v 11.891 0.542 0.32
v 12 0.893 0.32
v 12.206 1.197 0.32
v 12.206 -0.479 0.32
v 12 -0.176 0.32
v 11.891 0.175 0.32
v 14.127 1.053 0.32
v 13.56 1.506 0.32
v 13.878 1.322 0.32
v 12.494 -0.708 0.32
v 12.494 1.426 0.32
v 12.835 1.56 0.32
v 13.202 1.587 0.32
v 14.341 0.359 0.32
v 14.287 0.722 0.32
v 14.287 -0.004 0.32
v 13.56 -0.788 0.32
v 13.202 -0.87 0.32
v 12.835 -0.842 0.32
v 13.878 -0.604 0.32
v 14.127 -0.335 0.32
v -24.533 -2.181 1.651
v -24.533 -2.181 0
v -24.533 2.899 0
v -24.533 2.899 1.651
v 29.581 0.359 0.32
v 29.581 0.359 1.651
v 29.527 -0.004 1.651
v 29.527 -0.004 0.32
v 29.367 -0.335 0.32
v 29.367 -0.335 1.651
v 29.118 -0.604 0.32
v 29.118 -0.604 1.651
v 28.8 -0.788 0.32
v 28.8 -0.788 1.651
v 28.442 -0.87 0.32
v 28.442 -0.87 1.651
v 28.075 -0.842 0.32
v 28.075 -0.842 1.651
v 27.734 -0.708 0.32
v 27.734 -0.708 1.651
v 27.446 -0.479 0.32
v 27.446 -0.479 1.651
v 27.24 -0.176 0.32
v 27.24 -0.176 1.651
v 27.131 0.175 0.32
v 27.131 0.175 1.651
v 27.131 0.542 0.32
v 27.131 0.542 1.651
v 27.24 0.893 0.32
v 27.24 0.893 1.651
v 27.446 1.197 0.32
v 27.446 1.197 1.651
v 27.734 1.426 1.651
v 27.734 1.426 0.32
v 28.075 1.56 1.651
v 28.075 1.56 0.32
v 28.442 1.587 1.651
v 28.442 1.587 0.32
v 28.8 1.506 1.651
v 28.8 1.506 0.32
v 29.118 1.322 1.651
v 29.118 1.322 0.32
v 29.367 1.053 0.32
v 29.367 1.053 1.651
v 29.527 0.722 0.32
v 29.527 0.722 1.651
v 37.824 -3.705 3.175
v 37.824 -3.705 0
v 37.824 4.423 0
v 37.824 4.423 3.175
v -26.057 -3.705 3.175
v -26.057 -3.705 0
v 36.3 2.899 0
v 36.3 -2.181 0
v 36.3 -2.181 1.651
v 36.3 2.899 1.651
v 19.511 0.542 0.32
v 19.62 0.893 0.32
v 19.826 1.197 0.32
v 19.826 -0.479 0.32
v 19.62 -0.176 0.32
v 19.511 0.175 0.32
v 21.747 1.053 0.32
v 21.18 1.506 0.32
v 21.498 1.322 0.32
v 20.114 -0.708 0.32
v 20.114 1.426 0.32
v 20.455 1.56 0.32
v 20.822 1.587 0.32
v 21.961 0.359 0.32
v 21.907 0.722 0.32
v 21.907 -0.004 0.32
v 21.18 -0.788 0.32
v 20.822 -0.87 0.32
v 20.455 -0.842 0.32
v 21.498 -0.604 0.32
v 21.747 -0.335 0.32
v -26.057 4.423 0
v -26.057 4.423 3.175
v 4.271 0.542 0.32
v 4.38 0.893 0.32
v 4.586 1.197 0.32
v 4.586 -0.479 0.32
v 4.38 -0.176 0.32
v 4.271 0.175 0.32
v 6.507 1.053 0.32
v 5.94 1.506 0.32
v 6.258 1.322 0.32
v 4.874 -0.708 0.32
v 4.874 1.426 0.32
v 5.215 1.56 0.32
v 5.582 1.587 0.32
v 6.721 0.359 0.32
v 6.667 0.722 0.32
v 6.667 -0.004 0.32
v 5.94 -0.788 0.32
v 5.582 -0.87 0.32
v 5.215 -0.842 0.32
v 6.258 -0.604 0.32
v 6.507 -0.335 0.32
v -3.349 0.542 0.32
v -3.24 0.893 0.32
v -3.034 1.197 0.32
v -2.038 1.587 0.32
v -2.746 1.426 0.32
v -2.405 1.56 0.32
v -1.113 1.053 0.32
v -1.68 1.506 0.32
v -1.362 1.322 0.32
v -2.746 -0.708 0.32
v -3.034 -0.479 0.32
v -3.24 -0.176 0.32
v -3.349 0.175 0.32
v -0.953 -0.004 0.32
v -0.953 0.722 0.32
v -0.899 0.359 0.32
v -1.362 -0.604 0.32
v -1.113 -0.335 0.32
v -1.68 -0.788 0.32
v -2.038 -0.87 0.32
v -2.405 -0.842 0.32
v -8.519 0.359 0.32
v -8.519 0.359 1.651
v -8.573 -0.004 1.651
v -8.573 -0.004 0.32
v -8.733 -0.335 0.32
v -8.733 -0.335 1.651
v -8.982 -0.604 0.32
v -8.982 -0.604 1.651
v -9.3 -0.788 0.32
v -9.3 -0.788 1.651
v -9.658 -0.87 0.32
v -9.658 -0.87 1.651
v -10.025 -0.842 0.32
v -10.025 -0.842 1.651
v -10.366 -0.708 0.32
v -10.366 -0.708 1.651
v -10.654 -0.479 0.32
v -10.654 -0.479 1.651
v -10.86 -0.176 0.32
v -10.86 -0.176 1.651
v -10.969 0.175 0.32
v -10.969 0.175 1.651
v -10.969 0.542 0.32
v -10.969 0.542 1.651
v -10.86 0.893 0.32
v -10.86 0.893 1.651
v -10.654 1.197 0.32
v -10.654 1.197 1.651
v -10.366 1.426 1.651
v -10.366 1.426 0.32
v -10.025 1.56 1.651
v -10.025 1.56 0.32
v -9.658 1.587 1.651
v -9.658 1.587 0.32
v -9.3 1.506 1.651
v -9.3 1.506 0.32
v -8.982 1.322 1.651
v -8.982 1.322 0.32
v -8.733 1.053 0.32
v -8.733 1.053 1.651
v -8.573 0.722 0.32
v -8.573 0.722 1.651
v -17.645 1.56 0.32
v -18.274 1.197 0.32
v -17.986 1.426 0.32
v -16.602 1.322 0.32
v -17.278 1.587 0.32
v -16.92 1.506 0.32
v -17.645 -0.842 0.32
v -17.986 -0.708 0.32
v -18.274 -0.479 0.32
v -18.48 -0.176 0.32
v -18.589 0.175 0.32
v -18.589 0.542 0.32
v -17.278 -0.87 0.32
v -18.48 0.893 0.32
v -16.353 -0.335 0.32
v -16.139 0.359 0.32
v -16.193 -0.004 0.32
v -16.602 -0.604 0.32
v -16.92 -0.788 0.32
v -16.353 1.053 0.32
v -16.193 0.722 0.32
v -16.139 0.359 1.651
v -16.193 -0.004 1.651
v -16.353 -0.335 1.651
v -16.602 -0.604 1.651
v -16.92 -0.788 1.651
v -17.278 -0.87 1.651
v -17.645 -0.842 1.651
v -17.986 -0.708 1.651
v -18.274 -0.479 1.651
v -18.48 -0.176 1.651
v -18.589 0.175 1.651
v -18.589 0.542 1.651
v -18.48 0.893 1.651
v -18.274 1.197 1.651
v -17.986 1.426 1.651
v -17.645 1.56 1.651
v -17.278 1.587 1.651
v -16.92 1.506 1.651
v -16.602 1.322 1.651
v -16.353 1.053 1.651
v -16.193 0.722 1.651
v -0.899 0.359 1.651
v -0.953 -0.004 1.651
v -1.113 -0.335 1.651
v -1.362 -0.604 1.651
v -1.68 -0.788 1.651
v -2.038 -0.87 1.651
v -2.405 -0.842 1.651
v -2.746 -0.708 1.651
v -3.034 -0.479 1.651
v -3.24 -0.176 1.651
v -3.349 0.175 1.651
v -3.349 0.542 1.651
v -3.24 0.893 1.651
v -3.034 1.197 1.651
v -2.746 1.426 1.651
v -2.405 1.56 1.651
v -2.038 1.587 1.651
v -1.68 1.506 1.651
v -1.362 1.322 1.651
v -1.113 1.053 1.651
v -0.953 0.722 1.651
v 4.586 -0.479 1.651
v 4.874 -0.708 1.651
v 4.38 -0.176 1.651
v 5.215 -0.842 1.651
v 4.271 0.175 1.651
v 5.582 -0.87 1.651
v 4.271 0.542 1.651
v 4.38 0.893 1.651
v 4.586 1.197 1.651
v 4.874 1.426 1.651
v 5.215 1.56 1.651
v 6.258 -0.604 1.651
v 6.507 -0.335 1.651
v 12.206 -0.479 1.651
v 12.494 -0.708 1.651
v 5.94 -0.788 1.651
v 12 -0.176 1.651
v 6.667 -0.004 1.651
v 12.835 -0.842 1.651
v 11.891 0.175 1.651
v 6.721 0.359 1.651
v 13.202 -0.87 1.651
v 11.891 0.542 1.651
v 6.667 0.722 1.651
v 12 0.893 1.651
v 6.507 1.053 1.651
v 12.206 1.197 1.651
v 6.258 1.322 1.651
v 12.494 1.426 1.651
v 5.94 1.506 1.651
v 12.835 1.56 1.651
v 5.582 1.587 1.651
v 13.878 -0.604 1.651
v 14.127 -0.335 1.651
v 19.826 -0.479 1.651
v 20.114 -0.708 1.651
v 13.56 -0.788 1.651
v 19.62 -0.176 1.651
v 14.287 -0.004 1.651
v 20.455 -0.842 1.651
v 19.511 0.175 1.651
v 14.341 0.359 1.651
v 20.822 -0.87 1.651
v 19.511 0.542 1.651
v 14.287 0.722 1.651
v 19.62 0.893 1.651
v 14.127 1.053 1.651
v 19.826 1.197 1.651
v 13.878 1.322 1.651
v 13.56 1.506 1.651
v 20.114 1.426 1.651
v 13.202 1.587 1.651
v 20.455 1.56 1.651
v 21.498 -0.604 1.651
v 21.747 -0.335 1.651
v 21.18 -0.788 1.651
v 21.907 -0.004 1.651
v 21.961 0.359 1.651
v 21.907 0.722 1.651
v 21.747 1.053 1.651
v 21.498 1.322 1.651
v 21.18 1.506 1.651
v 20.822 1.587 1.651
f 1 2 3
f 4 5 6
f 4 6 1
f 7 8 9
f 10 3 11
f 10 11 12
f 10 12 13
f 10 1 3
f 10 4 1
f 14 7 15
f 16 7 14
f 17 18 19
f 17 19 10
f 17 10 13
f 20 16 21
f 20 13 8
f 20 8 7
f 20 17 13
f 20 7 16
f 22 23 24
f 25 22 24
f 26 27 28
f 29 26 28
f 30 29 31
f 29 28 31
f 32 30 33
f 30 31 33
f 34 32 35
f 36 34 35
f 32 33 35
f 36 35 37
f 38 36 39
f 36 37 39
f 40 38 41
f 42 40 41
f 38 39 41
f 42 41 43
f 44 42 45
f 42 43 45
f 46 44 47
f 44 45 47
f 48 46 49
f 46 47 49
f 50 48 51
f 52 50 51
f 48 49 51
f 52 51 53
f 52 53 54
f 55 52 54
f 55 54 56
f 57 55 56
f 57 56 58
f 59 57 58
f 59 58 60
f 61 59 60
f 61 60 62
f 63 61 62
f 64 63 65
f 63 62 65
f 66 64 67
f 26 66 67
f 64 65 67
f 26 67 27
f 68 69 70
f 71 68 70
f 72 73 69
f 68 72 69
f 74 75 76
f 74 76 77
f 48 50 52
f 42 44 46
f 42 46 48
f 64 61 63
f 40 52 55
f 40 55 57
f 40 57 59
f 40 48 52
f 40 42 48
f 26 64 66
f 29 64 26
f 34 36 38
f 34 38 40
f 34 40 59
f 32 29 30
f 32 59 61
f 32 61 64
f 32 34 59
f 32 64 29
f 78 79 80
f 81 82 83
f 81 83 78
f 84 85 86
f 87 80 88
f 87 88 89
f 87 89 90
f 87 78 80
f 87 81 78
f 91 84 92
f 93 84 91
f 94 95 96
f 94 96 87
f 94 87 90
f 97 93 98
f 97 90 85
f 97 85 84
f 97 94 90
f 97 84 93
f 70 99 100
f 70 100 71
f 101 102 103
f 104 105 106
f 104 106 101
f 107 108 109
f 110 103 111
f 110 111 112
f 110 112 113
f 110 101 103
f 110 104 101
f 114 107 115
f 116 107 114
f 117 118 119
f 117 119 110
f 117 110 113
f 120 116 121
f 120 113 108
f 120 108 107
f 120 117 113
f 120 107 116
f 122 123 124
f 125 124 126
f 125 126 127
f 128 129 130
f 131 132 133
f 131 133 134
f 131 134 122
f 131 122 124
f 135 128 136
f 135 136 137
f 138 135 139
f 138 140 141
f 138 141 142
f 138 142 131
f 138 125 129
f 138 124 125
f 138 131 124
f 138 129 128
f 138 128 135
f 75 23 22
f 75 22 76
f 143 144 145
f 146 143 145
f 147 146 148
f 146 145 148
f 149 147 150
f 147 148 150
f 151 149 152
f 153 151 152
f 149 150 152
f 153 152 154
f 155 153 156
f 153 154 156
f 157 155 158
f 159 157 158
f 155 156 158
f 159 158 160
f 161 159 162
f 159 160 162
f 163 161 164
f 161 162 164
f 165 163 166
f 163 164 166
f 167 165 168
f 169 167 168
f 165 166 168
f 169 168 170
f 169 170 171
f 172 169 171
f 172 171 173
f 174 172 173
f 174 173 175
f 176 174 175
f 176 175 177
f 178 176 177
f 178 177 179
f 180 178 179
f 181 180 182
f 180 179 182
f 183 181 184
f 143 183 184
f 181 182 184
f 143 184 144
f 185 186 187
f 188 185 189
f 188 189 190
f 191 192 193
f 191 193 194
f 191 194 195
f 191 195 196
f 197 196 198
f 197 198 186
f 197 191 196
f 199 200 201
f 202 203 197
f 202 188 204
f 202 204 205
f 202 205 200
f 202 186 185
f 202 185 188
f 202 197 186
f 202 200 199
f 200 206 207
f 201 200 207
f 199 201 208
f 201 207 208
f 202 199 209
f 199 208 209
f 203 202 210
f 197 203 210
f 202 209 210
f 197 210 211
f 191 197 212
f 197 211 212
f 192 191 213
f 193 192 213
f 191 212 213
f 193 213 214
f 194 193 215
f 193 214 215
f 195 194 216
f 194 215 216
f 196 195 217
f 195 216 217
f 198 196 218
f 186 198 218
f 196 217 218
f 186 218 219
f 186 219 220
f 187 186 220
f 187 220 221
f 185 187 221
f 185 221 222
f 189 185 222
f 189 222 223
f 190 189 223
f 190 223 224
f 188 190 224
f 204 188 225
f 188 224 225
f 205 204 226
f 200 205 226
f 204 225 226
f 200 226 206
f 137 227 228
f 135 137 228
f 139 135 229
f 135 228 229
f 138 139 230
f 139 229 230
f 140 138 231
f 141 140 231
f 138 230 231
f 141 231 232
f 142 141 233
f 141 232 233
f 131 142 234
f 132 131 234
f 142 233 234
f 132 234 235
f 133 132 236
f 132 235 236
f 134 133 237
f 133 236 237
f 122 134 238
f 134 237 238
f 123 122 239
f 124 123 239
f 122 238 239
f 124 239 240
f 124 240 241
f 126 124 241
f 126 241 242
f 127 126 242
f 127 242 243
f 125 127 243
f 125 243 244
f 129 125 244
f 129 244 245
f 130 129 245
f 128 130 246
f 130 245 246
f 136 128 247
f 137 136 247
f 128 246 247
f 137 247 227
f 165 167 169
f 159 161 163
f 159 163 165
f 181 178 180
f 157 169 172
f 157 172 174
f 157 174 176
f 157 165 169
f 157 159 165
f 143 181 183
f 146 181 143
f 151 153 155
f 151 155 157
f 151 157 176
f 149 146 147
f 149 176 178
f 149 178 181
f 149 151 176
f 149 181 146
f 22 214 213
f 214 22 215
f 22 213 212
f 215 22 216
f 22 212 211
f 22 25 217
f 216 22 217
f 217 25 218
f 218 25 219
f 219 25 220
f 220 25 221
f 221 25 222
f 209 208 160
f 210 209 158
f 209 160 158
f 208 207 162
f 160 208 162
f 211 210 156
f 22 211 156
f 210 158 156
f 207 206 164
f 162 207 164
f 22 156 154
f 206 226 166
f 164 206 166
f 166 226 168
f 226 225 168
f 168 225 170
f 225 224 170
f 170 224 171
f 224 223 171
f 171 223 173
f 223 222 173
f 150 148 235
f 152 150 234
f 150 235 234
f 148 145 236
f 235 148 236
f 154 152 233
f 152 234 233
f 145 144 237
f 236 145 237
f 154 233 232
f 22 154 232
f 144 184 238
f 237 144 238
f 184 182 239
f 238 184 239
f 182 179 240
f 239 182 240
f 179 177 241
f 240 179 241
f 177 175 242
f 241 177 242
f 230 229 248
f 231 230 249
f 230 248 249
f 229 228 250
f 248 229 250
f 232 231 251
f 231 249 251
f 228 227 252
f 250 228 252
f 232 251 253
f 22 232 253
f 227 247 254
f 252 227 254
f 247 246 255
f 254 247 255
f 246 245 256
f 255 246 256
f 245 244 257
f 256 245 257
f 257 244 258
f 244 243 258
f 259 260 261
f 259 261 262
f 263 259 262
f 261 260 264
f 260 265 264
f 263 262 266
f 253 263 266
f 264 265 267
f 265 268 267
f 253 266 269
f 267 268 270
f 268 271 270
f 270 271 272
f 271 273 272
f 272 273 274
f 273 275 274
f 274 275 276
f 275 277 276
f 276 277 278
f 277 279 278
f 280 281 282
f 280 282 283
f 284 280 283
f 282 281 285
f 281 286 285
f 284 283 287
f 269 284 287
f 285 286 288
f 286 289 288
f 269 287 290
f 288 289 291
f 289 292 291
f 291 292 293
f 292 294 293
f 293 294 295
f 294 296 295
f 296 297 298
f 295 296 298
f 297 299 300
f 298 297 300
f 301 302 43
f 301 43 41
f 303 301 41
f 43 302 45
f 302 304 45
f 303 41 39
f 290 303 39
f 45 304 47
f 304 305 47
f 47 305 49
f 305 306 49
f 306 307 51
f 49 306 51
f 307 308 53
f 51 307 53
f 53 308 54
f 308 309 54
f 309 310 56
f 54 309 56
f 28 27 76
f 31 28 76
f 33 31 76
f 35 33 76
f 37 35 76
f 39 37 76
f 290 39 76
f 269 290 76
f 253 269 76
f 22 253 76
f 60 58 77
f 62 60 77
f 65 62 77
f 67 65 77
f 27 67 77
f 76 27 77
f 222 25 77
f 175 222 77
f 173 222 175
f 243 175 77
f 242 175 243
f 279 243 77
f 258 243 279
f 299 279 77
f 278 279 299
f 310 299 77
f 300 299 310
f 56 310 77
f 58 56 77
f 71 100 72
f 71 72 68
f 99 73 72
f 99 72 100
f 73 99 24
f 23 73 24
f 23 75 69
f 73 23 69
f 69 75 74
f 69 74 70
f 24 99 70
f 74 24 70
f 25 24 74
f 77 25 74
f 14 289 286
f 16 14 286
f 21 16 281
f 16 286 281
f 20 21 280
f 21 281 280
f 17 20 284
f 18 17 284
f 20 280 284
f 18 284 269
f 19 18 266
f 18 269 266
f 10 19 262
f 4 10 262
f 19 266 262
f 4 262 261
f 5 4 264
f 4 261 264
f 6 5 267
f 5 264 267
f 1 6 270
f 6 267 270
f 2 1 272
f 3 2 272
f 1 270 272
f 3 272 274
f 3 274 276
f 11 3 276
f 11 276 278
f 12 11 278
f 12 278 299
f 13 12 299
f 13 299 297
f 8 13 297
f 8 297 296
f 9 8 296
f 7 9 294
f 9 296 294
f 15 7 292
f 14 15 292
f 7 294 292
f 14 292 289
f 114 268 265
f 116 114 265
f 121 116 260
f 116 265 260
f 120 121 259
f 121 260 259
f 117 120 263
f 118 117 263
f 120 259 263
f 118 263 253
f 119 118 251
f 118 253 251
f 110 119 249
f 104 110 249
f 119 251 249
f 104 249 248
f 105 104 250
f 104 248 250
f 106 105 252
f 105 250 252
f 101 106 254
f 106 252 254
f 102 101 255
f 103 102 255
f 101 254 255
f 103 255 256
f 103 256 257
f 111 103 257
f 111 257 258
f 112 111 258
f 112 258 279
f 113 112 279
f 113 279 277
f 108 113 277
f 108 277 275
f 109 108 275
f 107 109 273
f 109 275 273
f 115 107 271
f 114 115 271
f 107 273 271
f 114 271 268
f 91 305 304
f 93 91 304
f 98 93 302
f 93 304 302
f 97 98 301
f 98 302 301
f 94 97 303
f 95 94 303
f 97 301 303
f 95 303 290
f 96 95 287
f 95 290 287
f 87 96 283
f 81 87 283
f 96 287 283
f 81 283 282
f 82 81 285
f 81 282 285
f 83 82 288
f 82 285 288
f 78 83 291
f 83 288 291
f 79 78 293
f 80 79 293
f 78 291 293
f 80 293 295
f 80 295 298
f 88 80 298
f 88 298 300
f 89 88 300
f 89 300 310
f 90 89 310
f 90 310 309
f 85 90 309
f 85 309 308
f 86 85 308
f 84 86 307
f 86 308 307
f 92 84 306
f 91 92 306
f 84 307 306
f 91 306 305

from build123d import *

# Parameters (mm, degrees)
F0_W     = 63.881
F0_H     = 8.128
F1_DEPTH = 3.175
F2_T     = -1.524
F3_R     = 1.2319
F4_DEPTH = 1.33086


with BuildPart() as f1:
    # F0 (on Top) → F1 (new body)
    with BuildSketch(Plane.XY):
        with Locations((5.883156, 0.358789)):
            Rectangle(F0_W, F0_H)
    extrude(amount=F1_DEPTH)

    # F2
    f2_openings = [f1.faces().sort_by_distance(p)[0] for p in [
        (5.883156, 0.358789, 0),
    ]]
    offset(amount=F2_T, openings=f2_openings)

    # F3 (on face) → F4 (join)
    with BuildSketch(Plane(origin=(0, 0, 1.651), x_dir=(1, 0, 0), z_dir=(0, 0, -1))):
        with Locations((28.349456, -0.358789)):
            Circle(F3_R)
        with Locations((20.729456, -0.358789)):
            Circle(F3_R)
        with Locations((13.109456, -0.358789)):
            Circle(F3_R)
        with Locations((5.489456, -0.358789)):
            Circle(F3_R)
        with Locations((-2.130544, -0.358789)):
            Circle(F3_R)
        with Locations((-9.750544, -0.358789)):
            Circle(F3_R)
        with BuildLine():
            ThreePointArc((-18.602444, -0.358789), (-17.370544, -1.590689), (-16.138644, -0.358789))
            ThreePointArc((-16.138644, -0.358789), (-17.370544, 0.873111), (-18.602444, -0.358789))
        make_face()
    extrude(amount=F4_DEPTH)


solid = f1.part
